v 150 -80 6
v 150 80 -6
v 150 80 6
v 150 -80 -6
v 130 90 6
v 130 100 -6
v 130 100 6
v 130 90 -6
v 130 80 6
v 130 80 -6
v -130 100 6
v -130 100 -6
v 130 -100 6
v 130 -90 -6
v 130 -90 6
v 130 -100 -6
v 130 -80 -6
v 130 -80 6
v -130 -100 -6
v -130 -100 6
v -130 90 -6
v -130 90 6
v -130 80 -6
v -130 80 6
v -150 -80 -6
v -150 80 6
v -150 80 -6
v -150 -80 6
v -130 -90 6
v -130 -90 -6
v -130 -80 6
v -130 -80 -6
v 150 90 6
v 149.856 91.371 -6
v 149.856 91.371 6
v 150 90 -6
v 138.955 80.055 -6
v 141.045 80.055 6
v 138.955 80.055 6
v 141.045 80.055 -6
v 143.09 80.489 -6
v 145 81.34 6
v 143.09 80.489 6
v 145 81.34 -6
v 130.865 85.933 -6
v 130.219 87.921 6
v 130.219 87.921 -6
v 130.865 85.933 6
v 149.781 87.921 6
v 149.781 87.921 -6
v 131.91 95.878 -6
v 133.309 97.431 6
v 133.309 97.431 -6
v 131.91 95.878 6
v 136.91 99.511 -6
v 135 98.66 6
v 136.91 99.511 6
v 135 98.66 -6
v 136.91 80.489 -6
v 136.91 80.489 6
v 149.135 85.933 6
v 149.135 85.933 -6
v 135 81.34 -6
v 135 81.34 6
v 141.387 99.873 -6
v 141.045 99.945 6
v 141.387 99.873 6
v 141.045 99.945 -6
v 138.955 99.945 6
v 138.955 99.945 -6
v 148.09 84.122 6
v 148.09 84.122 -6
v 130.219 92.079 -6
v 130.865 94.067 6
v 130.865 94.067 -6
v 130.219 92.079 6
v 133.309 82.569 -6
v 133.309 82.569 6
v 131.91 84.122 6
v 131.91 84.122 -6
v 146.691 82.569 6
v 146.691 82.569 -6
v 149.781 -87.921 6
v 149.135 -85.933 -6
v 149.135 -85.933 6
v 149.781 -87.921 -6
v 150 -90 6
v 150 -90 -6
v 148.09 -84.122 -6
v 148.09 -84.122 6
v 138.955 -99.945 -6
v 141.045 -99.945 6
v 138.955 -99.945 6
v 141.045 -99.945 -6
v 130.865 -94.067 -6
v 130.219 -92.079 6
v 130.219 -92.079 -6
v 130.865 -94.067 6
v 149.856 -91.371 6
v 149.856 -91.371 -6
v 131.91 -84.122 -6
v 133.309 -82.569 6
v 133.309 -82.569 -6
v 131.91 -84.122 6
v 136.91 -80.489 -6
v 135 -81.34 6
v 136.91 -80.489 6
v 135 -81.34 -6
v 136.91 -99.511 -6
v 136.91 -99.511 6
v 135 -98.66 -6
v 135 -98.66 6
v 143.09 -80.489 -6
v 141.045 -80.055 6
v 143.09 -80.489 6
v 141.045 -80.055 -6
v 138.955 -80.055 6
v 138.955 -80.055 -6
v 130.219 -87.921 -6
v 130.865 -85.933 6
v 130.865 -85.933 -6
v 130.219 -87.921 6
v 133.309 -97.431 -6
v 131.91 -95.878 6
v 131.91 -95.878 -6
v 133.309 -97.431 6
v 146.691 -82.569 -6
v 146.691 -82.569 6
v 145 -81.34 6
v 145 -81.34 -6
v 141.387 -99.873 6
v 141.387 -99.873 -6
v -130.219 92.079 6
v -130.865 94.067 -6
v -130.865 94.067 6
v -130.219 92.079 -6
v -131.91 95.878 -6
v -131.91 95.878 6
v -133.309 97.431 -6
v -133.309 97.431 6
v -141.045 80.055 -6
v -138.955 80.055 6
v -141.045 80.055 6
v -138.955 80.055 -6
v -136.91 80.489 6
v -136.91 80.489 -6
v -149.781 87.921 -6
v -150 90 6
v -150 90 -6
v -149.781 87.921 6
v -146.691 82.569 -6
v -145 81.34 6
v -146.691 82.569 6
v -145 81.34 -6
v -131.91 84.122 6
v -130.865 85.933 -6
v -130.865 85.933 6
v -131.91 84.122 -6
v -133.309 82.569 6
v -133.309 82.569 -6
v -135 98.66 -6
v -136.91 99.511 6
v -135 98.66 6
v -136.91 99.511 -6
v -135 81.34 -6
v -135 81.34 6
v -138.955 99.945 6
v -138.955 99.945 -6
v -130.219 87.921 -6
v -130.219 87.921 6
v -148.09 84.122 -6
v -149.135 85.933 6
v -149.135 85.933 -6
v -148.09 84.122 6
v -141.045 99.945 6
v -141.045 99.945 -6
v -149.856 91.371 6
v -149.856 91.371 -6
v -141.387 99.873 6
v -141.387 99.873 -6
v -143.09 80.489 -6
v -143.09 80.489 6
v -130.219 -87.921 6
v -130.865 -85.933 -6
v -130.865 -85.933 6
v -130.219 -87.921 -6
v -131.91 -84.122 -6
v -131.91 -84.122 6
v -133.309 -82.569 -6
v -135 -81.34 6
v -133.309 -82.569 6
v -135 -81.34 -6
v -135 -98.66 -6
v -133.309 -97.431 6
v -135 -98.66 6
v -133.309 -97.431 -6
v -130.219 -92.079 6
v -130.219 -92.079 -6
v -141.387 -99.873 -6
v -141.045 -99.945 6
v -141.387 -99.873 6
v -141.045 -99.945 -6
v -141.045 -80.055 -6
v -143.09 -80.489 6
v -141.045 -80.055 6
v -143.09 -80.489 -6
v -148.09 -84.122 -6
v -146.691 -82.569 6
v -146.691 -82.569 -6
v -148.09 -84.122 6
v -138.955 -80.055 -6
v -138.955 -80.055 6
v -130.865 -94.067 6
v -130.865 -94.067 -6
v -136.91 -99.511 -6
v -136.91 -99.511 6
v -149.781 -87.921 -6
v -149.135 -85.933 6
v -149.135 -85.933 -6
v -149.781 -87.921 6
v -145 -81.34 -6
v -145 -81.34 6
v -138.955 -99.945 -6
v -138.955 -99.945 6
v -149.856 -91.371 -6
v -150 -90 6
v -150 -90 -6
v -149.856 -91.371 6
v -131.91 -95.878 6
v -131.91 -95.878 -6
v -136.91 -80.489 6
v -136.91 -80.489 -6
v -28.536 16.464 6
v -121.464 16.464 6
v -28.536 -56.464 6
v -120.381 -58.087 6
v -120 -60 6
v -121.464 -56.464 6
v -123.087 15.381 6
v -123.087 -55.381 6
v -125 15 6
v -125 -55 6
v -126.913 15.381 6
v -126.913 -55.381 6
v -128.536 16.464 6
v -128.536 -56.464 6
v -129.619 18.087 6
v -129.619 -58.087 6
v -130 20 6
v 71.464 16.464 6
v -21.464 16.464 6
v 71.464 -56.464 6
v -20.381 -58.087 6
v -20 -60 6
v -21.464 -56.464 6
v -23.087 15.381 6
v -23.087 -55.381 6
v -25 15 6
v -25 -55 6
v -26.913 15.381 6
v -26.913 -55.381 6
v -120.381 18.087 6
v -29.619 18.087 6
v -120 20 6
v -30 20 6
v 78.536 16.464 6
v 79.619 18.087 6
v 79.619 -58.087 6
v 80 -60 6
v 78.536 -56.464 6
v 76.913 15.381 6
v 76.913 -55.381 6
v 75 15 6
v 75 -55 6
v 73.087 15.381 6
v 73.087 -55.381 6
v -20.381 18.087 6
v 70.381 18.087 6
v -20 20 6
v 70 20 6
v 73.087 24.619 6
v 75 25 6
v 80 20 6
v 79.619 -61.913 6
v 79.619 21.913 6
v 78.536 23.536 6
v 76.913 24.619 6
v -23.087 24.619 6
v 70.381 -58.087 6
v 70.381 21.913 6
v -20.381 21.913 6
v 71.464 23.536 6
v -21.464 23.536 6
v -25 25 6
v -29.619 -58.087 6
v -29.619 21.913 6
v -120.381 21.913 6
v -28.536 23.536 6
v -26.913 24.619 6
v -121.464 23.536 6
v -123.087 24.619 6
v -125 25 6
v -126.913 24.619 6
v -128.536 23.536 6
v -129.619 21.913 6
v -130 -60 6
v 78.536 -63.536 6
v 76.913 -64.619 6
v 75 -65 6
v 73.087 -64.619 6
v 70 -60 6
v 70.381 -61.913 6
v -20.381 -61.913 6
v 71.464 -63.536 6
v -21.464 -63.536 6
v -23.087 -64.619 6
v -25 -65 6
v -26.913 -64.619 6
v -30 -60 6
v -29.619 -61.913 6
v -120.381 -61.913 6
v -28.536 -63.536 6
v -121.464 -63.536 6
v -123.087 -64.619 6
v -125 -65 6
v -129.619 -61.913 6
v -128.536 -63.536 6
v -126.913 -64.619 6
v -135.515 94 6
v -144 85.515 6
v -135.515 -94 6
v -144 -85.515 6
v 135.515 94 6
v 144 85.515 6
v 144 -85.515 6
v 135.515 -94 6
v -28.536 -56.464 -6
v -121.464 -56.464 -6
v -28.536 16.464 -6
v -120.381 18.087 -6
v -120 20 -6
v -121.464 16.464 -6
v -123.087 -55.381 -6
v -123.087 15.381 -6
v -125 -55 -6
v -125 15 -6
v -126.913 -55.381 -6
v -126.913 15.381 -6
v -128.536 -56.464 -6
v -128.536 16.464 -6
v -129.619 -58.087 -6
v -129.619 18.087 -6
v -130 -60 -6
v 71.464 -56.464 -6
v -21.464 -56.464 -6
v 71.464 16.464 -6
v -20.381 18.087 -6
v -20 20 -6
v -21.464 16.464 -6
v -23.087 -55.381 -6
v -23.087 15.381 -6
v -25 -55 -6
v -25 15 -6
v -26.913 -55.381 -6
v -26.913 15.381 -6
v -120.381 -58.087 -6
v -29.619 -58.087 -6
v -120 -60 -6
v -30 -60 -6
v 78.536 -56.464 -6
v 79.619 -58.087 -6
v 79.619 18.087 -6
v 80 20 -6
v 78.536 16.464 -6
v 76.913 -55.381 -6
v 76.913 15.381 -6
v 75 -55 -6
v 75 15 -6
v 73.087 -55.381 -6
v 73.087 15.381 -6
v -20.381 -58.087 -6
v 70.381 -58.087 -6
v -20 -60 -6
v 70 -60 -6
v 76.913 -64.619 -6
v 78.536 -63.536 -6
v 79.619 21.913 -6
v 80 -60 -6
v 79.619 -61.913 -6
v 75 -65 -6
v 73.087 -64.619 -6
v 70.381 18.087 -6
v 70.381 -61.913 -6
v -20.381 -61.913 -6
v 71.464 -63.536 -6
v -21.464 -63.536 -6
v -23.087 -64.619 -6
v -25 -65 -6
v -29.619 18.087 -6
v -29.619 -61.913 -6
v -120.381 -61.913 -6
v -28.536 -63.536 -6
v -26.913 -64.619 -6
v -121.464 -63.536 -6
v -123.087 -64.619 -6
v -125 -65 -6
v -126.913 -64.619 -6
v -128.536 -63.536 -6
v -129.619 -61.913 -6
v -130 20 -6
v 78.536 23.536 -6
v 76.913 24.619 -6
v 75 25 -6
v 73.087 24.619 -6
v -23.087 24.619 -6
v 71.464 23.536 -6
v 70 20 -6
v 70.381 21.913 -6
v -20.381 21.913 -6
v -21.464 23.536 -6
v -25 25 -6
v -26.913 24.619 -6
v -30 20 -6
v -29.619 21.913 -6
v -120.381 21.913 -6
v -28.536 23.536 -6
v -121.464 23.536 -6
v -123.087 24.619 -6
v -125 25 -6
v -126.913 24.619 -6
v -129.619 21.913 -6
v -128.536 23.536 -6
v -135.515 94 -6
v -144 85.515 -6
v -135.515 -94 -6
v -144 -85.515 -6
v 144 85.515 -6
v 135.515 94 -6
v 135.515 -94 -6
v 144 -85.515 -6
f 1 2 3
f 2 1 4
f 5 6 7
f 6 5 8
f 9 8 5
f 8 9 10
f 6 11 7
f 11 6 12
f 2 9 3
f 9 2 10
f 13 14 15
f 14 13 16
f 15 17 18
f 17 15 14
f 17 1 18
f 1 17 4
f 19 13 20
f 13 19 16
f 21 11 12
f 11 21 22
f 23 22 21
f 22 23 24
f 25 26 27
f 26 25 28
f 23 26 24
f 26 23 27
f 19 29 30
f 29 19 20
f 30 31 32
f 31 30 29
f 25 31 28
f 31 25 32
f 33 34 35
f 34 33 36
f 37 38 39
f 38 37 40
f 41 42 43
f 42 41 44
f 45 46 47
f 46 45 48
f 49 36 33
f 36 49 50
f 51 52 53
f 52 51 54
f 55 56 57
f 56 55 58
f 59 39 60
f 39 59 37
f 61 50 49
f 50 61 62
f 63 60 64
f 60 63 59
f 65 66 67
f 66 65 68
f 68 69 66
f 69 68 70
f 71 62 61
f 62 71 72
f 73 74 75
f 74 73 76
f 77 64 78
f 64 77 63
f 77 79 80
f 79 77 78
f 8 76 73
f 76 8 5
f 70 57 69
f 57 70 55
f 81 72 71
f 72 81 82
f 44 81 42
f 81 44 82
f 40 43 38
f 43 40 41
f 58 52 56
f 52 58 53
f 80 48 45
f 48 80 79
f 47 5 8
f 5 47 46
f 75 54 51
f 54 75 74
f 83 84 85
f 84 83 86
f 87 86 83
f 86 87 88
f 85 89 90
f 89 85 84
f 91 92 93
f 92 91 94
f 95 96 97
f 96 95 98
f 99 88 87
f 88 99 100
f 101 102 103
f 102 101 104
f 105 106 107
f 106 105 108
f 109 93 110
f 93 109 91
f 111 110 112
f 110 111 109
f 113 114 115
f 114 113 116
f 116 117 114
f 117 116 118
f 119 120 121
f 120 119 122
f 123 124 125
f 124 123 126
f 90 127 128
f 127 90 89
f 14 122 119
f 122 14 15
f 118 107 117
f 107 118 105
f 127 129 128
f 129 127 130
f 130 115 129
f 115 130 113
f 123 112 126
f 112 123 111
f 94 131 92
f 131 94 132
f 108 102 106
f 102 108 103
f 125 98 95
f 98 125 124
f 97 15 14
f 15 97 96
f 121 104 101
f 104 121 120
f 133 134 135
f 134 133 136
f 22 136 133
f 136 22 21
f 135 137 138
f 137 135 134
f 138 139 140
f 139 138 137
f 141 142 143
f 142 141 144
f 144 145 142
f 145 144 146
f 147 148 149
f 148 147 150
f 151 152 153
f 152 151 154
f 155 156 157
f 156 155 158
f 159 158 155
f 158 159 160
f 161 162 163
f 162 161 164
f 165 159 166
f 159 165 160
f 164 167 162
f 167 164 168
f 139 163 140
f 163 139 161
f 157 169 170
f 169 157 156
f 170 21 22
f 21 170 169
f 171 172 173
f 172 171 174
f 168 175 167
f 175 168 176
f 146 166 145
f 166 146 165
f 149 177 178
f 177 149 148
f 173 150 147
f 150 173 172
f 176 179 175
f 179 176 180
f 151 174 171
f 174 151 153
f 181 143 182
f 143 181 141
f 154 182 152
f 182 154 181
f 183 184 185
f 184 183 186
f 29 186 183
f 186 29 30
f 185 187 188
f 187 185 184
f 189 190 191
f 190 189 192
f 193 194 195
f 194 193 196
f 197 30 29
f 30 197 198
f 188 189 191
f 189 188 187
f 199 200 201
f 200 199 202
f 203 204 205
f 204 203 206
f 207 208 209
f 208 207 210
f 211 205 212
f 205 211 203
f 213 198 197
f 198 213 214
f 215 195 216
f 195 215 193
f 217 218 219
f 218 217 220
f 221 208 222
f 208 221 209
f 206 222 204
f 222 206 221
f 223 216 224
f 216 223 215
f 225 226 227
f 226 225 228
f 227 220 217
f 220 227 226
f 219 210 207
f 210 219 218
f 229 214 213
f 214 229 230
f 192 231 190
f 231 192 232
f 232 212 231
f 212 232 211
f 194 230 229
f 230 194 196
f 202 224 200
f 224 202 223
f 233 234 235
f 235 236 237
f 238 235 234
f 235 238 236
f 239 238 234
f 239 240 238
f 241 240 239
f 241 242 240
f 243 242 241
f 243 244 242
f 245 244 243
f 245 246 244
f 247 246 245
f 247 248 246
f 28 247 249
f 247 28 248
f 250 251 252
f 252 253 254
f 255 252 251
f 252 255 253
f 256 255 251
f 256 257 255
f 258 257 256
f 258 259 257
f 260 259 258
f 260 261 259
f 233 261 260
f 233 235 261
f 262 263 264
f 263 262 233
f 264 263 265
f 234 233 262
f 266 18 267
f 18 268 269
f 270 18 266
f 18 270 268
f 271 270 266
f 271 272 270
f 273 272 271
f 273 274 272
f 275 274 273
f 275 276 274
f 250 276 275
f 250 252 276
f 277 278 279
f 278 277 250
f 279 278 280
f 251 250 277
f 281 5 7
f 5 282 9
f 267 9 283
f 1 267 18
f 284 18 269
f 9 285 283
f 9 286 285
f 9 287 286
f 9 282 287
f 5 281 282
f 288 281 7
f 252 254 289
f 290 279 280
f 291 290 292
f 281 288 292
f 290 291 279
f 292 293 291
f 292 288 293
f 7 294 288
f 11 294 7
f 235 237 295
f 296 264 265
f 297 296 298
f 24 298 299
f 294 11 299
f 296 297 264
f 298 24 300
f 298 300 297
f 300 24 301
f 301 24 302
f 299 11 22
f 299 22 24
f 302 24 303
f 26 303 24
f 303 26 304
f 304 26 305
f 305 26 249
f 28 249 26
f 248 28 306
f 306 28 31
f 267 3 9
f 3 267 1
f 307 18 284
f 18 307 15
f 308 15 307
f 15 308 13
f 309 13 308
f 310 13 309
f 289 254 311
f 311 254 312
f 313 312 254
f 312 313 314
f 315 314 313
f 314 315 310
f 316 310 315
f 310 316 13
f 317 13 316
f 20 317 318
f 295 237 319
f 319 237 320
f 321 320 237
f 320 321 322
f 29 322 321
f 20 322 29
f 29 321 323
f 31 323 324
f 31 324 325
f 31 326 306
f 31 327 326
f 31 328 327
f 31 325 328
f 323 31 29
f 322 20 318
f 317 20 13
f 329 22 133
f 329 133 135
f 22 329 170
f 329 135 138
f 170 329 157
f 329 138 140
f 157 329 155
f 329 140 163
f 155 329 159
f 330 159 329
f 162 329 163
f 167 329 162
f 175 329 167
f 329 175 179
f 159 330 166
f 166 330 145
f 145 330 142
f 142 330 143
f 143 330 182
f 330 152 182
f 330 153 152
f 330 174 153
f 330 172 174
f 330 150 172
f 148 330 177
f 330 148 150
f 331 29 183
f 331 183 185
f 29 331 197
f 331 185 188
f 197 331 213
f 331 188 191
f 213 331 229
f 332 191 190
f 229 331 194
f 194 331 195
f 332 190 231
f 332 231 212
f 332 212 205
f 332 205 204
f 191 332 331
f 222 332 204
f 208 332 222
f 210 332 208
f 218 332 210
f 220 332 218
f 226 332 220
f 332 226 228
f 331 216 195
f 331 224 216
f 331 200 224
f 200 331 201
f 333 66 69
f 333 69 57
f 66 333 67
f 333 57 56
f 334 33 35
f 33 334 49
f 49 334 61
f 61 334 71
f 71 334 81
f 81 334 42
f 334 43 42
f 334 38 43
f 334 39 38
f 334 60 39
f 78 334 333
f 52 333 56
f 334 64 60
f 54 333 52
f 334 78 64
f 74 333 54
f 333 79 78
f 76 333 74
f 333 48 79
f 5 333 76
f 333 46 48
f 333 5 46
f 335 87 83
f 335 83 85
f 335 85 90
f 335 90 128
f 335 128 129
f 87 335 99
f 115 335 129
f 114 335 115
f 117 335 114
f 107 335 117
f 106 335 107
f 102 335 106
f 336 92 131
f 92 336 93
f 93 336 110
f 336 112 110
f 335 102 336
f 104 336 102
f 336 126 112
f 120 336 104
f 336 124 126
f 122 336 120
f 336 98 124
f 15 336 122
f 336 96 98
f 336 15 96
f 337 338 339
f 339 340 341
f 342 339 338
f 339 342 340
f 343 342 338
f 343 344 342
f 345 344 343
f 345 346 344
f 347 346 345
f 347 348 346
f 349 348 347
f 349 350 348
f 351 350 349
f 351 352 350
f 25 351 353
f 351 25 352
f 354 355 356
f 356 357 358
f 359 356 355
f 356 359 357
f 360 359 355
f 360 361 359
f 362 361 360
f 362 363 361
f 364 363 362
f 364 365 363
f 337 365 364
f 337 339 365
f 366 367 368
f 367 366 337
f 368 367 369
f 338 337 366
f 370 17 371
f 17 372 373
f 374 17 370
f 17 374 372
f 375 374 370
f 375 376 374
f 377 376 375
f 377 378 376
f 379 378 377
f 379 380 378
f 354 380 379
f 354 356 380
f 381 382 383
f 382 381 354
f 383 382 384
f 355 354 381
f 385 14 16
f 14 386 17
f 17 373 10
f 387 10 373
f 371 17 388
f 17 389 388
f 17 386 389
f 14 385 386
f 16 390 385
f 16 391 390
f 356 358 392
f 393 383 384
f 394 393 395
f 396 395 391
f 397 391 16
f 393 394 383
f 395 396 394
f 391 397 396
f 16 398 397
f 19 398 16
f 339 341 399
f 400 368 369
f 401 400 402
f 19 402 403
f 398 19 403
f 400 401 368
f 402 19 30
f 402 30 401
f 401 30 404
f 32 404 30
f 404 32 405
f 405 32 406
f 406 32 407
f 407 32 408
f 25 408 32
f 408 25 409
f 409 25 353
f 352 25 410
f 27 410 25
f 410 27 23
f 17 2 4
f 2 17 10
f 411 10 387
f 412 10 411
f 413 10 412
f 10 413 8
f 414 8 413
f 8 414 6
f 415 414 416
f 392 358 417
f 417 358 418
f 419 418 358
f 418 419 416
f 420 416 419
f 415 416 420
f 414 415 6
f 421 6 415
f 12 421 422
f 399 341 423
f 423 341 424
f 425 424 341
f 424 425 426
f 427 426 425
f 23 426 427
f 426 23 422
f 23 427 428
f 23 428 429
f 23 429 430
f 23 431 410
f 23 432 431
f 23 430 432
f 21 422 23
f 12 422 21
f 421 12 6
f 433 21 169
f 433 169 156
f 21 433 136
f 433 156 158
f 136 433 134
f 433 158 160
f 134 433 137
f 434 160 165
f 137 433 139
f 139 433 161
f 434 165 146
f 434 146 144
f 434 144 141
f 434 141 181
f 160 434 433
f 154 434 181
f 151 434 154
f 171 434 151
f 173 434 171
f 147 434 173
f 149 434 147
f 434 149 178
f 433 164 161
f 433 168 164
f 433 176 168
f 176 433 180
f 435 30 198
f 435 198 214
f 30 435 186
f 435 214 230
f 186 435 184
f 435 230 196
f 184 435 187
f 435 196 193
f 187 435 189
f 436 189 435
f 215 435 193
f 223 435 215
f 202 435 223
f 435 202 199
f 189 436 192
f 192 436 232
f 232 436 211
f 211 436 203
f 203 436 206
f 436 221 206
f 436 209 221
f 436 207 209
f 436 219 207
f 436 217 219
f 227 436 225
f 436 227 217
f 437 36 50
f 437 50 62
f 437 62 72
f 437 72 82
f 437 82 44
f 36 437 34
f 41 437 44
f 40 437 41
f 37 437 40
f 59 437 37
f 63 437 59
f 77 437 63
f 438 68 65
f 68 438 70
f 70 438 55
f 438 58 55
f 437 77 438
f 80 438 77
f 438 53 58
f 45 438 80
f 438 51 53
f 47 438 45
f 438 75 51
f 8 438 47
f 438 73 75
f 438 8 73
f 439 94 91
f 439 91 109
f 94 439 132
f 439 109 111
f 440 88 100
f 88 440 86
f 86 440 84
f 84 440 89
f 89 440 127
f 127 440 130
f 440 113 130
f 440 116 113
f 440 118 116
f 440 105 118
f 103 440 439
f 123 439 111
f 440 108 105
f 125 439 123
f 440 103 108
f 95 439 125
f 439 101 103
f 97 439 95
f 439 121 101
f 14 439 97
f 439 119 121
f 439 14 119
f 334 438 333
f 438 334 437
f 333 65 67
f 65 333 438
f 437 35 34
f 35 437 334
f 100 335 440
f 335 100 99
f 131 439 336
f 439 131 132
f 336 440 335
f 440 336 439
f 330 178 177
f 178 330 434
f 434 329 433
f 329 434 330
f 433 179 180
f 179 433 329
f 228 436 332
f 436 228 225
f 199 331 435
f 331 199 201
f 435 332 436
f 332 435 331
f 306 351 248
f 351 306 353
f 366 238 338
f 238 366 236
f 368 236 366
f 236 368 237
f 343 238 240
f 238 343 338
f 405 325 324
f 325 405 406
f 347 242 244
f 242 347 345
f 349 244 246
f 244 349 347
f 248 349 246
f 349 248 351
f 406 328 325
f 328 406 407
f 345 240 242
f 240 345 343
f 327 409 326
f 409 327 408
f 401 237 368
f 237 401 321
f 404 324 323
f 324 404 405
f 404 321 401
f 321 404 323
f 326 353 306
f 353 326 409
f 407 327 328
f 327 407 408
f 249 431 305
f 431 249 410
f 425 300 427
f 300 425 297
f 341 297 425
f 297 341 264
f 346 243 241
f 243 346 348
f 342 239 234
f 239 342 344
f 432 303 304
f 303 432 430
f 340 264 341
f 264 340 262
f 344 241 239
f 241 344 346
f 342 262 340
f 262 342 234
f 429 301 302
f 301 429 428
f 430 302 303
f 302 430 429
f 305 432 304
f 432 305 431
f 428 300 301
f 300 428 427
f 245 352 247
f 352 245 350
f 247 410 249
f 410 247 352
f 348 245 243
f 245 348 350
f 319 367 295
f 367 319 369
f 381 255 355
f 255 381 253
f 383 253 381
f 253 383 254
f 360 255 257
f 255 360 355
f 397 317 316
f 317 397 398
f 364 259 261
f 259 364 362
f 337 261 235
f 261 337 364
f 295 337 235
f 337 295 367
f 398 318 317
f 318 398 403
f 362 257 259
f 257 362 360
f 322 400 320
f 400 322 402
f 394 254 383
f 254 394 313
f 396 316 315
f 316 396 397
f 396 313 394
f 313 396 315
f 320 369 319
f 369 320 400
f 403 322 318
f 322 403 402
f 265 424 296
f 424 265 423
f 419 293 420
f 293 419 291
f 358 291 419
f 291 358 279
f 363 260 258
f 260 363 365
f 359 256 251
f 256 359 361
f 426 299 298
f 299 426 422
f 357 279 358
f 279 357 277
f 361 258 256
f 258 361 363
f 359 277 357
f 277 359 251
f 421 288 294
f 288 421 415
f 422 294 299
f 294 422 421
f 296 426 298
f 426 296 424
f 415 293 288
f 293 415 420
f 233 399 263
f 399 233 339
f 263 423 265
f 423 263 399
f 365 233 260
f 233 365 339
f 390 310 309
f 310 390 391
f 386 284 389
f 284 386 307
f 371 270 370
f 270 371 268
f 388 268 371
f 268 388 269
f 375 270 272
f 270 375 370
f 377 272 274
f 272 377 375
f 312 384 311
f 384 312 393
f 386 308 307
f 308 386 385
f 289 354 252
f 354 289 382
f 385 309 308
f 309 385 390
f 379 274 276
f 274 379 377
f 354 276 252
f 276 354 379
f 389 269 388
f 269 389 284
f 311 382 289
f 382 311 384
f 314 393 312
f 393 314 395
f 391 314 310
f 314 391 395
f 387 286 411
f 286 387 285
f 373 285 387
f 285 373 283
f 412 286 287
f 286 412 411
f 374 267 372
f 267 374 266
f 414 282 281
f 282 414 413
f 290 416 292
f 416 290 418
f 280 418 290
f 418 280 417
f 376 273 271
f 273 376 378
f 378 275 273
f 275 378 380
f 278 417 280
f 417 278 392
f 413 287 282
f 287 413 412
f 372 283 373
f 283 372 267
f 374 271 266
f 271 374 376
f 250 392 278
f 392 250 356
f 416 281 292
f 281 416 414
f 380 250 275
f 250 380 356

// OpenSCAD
// Parameters
plate_L = 300; //[150:600:1]
plate_W = 200; //[100:400:1]
plate_T = 12; //[6:24:1]
corner_radius = 10; //[5:20:1]
chamfer_leg = 6; //[3:12:1]
hole_d = 10; //[5:20:1]
edge_margin_x = 25; //[12:60:1]
edge_margin_y = 20; //[10:50:1]
hole_pitch_x = 100; //[50:200:1]
hole_pitch_y = 80; //[40:160:1]
hole_cols = 3; //[2:6:1]
hole_rows = 2; //[2:6:1]
overlap = 1; //[0.5:2:0.5]

// Base shapes
module tooling_plate_body() {
  translate([0, 0, 0])
    cube([plate_L, plate_W, plate_T], center=true);
}

module rounded_corner_cyl(x, y) {
  translate([x, y, 0])
    cylinder(r=corner_radius, h=plate_T + 2*overlap, center=true);
}

module corner_cut_box(x, y) {
  translate([x, y, 0])
    cube([corner_radius*2, corner_radius*2, plate_T + 2*overlap], center=true);
}

module chamfer_cut(x, y) {
  translate([x, y, 0])
    rotate([0, 0, 45])
      cube([chamfer_leg*2, chamfer_leg*2, plate_T + 2*overlap], center=true);
}

module mount_hole(x, y) {
  translate([x, y, 0])
    cylinder(r=hole_d/2, h=plate_T + 2*overlap, center=true);
}

// Operations
module rounded_corners() {
  difference() {
    union() {
      corner_cut_box(plate_L/2 - corner_radius, plate_W/2 - corner_radius);
      corner_cut_box(plate_L/2 - corner_radius, -plate_W/2 + corner_radius);
      corner_cut_box(-plate_L/2 + corner_radius, plate_W/2 - corner_radius);
      corner_cut_box(-plate_L/2 + corner_radius, -plate_W/2 + corner_radius);
    }
    union() {
      rounded_corner_cyl(plate_L/2 - corner_radius, plate_W/2 - corner_radius);
      rounded_corner_cyl(plate_L/2 - corner_radius, -plate_W/2 + corner_radius);
      rounded_corner_cyl(-plate_L/2 + corner_radius, plate_W/2 - corner_radius);
      rounded_corner_cyl(-plate_L/2 + corner_radius, -plate_W/2 + corner_radius);
    }
  }
}

module corner_chamfers() {
  union() {
    chamfer_cut(plate_L/2 - chamfer_leg, plate_W/2 - chamfer_leg);
    chamfer_cut(plate_L/2 - chamfer_leg, -plate_W/2 + chamfer_leg);
    chamfer_cut(-plate_L/2 + chamfer_leg, plate_W/2 - chamfer_leg);
    chamfer_cut(-plate_L/2 + chamfer_leg, -plate_W/2 + chamfer_leg);
  }
}

module mounting_holes_pattern() {
  union() {
    for (i = [0:hole_cols-1]) {
      for (j = [0:hole_rows-1]) {
        mount_hole(
          -(edge_margin_x + (hole_cols-1)*hole_pitch_x/2) + i*hole_pitch_x,
          -(edge_margin_y + (hole_rows-1)*hole_pitch_y/2) + j*hole_pitch_y
        );
      }
    }
  }
}

// Final model
module complete_model() {
  difference() {
    difference() {
      difference() {
        tooling_plate_body();
        rounded_corners();
      }
      corner_chamfers();
    }
    mounting_holes_pattern();
  }
}

// Render the complete model
color("Silver") complete_model();
